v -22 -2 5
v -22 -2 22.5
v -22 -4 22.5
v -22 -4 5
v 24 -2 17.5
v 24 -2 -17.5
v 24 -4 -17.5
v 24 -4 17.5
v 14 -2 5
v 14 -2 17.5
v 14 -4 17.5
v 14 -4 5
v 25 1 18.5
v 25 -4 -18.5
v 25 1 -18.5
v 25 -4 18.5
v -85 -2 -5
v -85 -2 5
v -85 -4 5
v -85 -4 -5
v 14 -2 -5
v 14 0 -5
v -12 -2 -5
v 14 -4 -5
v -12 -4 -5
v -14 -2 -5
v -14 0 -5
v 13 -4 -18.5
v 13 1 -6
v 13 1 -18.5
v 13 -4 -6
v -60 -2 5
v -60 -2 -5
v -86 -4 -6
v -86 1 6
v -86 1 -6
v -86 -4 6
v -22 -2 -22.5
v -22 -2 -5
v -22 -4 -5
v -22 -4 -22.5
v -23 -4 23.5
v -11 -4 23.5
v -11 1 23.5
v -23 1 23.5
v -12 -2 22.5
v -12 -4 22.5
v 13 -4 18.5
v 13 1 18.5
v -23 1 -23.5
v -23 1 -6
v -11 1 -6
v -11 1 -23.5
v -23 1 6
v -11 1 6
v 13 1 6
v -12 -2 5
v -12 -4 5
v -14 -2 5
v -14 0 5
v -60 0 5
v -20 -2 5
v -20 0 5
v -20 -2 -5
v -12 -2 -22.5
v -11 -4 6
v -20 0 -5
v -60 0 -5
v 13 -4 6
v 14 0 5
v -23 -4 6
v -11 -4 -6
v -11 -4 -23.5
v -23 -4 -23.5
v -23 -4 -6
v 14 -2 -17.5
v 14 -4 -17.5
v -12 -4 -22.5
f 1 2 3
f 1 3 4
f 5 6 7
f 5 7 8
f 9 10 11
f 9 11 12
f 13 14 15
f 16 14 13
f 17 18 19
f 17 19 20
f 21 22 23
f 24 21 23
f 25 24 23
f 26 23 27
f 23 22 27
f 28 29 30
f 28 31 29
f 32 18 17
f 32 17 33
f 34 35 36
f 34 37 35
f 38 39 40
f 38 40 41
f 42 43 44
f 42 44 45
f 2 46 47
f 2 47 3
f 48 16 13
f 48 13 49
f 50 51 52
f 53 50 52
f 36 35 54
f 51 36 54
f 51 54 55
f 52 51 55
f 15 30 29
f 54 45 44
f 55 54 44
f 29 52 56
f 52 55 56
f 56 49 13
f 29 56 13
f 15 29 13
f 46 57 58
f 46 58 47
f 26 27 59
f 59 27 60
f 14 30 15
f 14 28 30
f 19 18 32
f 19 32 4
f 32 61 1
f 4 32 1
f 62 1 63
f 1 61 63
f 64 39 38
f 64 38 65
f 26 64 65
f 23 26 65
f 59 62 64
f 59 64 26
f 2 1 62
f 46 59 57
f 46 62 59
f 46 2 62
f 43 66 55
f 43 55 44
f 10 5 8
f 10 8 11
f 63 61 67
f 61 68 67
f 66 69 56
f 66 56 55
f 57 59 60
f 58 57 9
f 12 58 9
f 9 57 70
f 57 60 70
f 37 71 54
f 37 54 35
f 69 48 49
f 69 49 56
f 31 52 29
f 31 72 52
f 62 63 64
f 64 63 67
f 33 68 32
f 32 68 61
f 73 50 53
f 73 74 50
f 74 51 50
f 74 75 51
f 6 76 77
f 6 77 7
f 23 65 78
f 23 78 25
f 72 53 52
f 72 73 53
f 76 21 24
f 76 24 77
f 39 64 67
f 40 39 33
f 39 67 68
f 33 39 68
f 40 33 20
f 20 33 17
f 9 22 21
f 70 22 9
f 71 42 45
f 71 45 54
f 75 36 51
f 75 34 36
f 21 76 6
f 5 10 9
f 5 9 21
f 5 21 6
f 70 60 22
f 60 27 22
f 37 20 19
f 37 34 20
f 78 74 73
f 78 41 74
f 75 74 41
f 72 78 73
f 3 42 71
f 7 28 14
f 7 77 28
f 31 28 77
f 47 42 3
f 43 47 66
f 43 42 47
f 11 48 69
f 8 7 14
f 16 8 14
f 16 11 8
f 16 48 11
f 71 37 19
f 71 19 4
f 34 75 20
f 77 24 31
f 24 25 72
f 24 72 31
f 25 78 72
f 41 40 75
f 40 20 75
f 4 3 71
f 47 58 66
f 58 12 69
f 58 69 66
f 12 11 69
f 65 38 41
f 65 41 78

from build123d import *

# Parameters (mm, degrees)
SKETCH_3_W           = 10
SKETCH_3_H           = 35
SKETCH_3_W_2         = 26
SKETCH_3_H_2         = 10
SKETCH_3_W_3         = 38
SKETCH_3_W_4         = 25
EXTRUDE_1_DEPTH      = 1
EXTRUDE_2_DEPTH      = 4
EXTRUDE_2_DEPTH_BACK = 1
SKETCH_5_W           = 25
SKETCH_5_H           = 10
SKETCH_5_W_2         = 10
SKETCH_5_H_2         = 35
EXTRUDE_3_DEPTH      = 2


with BuildPart() as part:
    # 草图3 → 凸台-拉伸1 (new body)
    with BuildSketch(Plane(origin=(0, 0, 0), x_dir=(1, 0, 0), z_dir=(0, 1, 0))):
        with Locations((19, 0)):
            Rectangle(SKETCH_3_W, SKETCH_3_H)
        with Locations((1, 0)):
            Rectangle(SKETCH_3_W_2, SKETCH_3_H_2)
        Polygon((-12, -5), (-12, 5), (-12, 22.5), (-22, 22.5), (-22, 5), (-22, -5), (-22, -22.5), (-12, -22.5), align=None)
        with Locations((-41, 0)):
            Rectangle(SKETCH_3_W_3, SKETCH_3_H_2)
        with Locations((-72.5, 0)):
            Rectangle(SKETCH_3_W_4, SKETCH_3_H_2)
    extrude(amount=EXTRUDE_1_DEPTH)

    # 草图4 → 凸台-拉伸2 (add, two sides)
    with BuildSketch(Plane.XZ) as extrude_2_sk:
        Polygon((13, -18.5), (25, -18.5), (25, 18.5), (13, 18.5), (13, 6), (-11, 6), (-11, 23.5), (-23, 23.5), (-23, 6), (-86, 6), (-86, -6), (-23, -6), (-23, -23.5), (-11, -23.5), (-11, -6), (13, -6), align=None)
        Polygon((14, -17.5), (24, -17.5), (24, 17.5), (14, 17.5), (14, 5), (-12, 5), (-12, 22.5), (-22, 22.5), (-22, 5), (-85, 5), (-85, -5), (-22, -5), (-22, -22.5), (-12, -22.5), (-12, -5), (14, -5), align=None, mode=Mode.SUBTRACT)
    extrude(amount=EXTRUDE_2_DEPTH)
    extrude(extrude_2_sk.sketch, amount=-EXTRUDE_2_DEPTH_BACK)

    # 草图5 → 凸台-拉伸3 (add)
    with BuildSketch(Plane.XZ):
        Polygon((-22, 22.5), (-22, 5), (-20, 5), (-20, -5), (-22, -5), (-22, -22.5), (-12, -22.5), (-12, -5), (-14, -5), (-14, 5), (-12, 5), (-12, 22.5), align=None)
        with Locations((-72.5, 0)):
            Rectangle(SKETCH_5_W, SKETCH_5_H)
        with Locations((19, 0)):
            Rectangle(SKETCH_5_W_2, SKETCH_5_H_2)
    extrude(amount=EXTRUDE_3_DEPTH)


solid = part.part
